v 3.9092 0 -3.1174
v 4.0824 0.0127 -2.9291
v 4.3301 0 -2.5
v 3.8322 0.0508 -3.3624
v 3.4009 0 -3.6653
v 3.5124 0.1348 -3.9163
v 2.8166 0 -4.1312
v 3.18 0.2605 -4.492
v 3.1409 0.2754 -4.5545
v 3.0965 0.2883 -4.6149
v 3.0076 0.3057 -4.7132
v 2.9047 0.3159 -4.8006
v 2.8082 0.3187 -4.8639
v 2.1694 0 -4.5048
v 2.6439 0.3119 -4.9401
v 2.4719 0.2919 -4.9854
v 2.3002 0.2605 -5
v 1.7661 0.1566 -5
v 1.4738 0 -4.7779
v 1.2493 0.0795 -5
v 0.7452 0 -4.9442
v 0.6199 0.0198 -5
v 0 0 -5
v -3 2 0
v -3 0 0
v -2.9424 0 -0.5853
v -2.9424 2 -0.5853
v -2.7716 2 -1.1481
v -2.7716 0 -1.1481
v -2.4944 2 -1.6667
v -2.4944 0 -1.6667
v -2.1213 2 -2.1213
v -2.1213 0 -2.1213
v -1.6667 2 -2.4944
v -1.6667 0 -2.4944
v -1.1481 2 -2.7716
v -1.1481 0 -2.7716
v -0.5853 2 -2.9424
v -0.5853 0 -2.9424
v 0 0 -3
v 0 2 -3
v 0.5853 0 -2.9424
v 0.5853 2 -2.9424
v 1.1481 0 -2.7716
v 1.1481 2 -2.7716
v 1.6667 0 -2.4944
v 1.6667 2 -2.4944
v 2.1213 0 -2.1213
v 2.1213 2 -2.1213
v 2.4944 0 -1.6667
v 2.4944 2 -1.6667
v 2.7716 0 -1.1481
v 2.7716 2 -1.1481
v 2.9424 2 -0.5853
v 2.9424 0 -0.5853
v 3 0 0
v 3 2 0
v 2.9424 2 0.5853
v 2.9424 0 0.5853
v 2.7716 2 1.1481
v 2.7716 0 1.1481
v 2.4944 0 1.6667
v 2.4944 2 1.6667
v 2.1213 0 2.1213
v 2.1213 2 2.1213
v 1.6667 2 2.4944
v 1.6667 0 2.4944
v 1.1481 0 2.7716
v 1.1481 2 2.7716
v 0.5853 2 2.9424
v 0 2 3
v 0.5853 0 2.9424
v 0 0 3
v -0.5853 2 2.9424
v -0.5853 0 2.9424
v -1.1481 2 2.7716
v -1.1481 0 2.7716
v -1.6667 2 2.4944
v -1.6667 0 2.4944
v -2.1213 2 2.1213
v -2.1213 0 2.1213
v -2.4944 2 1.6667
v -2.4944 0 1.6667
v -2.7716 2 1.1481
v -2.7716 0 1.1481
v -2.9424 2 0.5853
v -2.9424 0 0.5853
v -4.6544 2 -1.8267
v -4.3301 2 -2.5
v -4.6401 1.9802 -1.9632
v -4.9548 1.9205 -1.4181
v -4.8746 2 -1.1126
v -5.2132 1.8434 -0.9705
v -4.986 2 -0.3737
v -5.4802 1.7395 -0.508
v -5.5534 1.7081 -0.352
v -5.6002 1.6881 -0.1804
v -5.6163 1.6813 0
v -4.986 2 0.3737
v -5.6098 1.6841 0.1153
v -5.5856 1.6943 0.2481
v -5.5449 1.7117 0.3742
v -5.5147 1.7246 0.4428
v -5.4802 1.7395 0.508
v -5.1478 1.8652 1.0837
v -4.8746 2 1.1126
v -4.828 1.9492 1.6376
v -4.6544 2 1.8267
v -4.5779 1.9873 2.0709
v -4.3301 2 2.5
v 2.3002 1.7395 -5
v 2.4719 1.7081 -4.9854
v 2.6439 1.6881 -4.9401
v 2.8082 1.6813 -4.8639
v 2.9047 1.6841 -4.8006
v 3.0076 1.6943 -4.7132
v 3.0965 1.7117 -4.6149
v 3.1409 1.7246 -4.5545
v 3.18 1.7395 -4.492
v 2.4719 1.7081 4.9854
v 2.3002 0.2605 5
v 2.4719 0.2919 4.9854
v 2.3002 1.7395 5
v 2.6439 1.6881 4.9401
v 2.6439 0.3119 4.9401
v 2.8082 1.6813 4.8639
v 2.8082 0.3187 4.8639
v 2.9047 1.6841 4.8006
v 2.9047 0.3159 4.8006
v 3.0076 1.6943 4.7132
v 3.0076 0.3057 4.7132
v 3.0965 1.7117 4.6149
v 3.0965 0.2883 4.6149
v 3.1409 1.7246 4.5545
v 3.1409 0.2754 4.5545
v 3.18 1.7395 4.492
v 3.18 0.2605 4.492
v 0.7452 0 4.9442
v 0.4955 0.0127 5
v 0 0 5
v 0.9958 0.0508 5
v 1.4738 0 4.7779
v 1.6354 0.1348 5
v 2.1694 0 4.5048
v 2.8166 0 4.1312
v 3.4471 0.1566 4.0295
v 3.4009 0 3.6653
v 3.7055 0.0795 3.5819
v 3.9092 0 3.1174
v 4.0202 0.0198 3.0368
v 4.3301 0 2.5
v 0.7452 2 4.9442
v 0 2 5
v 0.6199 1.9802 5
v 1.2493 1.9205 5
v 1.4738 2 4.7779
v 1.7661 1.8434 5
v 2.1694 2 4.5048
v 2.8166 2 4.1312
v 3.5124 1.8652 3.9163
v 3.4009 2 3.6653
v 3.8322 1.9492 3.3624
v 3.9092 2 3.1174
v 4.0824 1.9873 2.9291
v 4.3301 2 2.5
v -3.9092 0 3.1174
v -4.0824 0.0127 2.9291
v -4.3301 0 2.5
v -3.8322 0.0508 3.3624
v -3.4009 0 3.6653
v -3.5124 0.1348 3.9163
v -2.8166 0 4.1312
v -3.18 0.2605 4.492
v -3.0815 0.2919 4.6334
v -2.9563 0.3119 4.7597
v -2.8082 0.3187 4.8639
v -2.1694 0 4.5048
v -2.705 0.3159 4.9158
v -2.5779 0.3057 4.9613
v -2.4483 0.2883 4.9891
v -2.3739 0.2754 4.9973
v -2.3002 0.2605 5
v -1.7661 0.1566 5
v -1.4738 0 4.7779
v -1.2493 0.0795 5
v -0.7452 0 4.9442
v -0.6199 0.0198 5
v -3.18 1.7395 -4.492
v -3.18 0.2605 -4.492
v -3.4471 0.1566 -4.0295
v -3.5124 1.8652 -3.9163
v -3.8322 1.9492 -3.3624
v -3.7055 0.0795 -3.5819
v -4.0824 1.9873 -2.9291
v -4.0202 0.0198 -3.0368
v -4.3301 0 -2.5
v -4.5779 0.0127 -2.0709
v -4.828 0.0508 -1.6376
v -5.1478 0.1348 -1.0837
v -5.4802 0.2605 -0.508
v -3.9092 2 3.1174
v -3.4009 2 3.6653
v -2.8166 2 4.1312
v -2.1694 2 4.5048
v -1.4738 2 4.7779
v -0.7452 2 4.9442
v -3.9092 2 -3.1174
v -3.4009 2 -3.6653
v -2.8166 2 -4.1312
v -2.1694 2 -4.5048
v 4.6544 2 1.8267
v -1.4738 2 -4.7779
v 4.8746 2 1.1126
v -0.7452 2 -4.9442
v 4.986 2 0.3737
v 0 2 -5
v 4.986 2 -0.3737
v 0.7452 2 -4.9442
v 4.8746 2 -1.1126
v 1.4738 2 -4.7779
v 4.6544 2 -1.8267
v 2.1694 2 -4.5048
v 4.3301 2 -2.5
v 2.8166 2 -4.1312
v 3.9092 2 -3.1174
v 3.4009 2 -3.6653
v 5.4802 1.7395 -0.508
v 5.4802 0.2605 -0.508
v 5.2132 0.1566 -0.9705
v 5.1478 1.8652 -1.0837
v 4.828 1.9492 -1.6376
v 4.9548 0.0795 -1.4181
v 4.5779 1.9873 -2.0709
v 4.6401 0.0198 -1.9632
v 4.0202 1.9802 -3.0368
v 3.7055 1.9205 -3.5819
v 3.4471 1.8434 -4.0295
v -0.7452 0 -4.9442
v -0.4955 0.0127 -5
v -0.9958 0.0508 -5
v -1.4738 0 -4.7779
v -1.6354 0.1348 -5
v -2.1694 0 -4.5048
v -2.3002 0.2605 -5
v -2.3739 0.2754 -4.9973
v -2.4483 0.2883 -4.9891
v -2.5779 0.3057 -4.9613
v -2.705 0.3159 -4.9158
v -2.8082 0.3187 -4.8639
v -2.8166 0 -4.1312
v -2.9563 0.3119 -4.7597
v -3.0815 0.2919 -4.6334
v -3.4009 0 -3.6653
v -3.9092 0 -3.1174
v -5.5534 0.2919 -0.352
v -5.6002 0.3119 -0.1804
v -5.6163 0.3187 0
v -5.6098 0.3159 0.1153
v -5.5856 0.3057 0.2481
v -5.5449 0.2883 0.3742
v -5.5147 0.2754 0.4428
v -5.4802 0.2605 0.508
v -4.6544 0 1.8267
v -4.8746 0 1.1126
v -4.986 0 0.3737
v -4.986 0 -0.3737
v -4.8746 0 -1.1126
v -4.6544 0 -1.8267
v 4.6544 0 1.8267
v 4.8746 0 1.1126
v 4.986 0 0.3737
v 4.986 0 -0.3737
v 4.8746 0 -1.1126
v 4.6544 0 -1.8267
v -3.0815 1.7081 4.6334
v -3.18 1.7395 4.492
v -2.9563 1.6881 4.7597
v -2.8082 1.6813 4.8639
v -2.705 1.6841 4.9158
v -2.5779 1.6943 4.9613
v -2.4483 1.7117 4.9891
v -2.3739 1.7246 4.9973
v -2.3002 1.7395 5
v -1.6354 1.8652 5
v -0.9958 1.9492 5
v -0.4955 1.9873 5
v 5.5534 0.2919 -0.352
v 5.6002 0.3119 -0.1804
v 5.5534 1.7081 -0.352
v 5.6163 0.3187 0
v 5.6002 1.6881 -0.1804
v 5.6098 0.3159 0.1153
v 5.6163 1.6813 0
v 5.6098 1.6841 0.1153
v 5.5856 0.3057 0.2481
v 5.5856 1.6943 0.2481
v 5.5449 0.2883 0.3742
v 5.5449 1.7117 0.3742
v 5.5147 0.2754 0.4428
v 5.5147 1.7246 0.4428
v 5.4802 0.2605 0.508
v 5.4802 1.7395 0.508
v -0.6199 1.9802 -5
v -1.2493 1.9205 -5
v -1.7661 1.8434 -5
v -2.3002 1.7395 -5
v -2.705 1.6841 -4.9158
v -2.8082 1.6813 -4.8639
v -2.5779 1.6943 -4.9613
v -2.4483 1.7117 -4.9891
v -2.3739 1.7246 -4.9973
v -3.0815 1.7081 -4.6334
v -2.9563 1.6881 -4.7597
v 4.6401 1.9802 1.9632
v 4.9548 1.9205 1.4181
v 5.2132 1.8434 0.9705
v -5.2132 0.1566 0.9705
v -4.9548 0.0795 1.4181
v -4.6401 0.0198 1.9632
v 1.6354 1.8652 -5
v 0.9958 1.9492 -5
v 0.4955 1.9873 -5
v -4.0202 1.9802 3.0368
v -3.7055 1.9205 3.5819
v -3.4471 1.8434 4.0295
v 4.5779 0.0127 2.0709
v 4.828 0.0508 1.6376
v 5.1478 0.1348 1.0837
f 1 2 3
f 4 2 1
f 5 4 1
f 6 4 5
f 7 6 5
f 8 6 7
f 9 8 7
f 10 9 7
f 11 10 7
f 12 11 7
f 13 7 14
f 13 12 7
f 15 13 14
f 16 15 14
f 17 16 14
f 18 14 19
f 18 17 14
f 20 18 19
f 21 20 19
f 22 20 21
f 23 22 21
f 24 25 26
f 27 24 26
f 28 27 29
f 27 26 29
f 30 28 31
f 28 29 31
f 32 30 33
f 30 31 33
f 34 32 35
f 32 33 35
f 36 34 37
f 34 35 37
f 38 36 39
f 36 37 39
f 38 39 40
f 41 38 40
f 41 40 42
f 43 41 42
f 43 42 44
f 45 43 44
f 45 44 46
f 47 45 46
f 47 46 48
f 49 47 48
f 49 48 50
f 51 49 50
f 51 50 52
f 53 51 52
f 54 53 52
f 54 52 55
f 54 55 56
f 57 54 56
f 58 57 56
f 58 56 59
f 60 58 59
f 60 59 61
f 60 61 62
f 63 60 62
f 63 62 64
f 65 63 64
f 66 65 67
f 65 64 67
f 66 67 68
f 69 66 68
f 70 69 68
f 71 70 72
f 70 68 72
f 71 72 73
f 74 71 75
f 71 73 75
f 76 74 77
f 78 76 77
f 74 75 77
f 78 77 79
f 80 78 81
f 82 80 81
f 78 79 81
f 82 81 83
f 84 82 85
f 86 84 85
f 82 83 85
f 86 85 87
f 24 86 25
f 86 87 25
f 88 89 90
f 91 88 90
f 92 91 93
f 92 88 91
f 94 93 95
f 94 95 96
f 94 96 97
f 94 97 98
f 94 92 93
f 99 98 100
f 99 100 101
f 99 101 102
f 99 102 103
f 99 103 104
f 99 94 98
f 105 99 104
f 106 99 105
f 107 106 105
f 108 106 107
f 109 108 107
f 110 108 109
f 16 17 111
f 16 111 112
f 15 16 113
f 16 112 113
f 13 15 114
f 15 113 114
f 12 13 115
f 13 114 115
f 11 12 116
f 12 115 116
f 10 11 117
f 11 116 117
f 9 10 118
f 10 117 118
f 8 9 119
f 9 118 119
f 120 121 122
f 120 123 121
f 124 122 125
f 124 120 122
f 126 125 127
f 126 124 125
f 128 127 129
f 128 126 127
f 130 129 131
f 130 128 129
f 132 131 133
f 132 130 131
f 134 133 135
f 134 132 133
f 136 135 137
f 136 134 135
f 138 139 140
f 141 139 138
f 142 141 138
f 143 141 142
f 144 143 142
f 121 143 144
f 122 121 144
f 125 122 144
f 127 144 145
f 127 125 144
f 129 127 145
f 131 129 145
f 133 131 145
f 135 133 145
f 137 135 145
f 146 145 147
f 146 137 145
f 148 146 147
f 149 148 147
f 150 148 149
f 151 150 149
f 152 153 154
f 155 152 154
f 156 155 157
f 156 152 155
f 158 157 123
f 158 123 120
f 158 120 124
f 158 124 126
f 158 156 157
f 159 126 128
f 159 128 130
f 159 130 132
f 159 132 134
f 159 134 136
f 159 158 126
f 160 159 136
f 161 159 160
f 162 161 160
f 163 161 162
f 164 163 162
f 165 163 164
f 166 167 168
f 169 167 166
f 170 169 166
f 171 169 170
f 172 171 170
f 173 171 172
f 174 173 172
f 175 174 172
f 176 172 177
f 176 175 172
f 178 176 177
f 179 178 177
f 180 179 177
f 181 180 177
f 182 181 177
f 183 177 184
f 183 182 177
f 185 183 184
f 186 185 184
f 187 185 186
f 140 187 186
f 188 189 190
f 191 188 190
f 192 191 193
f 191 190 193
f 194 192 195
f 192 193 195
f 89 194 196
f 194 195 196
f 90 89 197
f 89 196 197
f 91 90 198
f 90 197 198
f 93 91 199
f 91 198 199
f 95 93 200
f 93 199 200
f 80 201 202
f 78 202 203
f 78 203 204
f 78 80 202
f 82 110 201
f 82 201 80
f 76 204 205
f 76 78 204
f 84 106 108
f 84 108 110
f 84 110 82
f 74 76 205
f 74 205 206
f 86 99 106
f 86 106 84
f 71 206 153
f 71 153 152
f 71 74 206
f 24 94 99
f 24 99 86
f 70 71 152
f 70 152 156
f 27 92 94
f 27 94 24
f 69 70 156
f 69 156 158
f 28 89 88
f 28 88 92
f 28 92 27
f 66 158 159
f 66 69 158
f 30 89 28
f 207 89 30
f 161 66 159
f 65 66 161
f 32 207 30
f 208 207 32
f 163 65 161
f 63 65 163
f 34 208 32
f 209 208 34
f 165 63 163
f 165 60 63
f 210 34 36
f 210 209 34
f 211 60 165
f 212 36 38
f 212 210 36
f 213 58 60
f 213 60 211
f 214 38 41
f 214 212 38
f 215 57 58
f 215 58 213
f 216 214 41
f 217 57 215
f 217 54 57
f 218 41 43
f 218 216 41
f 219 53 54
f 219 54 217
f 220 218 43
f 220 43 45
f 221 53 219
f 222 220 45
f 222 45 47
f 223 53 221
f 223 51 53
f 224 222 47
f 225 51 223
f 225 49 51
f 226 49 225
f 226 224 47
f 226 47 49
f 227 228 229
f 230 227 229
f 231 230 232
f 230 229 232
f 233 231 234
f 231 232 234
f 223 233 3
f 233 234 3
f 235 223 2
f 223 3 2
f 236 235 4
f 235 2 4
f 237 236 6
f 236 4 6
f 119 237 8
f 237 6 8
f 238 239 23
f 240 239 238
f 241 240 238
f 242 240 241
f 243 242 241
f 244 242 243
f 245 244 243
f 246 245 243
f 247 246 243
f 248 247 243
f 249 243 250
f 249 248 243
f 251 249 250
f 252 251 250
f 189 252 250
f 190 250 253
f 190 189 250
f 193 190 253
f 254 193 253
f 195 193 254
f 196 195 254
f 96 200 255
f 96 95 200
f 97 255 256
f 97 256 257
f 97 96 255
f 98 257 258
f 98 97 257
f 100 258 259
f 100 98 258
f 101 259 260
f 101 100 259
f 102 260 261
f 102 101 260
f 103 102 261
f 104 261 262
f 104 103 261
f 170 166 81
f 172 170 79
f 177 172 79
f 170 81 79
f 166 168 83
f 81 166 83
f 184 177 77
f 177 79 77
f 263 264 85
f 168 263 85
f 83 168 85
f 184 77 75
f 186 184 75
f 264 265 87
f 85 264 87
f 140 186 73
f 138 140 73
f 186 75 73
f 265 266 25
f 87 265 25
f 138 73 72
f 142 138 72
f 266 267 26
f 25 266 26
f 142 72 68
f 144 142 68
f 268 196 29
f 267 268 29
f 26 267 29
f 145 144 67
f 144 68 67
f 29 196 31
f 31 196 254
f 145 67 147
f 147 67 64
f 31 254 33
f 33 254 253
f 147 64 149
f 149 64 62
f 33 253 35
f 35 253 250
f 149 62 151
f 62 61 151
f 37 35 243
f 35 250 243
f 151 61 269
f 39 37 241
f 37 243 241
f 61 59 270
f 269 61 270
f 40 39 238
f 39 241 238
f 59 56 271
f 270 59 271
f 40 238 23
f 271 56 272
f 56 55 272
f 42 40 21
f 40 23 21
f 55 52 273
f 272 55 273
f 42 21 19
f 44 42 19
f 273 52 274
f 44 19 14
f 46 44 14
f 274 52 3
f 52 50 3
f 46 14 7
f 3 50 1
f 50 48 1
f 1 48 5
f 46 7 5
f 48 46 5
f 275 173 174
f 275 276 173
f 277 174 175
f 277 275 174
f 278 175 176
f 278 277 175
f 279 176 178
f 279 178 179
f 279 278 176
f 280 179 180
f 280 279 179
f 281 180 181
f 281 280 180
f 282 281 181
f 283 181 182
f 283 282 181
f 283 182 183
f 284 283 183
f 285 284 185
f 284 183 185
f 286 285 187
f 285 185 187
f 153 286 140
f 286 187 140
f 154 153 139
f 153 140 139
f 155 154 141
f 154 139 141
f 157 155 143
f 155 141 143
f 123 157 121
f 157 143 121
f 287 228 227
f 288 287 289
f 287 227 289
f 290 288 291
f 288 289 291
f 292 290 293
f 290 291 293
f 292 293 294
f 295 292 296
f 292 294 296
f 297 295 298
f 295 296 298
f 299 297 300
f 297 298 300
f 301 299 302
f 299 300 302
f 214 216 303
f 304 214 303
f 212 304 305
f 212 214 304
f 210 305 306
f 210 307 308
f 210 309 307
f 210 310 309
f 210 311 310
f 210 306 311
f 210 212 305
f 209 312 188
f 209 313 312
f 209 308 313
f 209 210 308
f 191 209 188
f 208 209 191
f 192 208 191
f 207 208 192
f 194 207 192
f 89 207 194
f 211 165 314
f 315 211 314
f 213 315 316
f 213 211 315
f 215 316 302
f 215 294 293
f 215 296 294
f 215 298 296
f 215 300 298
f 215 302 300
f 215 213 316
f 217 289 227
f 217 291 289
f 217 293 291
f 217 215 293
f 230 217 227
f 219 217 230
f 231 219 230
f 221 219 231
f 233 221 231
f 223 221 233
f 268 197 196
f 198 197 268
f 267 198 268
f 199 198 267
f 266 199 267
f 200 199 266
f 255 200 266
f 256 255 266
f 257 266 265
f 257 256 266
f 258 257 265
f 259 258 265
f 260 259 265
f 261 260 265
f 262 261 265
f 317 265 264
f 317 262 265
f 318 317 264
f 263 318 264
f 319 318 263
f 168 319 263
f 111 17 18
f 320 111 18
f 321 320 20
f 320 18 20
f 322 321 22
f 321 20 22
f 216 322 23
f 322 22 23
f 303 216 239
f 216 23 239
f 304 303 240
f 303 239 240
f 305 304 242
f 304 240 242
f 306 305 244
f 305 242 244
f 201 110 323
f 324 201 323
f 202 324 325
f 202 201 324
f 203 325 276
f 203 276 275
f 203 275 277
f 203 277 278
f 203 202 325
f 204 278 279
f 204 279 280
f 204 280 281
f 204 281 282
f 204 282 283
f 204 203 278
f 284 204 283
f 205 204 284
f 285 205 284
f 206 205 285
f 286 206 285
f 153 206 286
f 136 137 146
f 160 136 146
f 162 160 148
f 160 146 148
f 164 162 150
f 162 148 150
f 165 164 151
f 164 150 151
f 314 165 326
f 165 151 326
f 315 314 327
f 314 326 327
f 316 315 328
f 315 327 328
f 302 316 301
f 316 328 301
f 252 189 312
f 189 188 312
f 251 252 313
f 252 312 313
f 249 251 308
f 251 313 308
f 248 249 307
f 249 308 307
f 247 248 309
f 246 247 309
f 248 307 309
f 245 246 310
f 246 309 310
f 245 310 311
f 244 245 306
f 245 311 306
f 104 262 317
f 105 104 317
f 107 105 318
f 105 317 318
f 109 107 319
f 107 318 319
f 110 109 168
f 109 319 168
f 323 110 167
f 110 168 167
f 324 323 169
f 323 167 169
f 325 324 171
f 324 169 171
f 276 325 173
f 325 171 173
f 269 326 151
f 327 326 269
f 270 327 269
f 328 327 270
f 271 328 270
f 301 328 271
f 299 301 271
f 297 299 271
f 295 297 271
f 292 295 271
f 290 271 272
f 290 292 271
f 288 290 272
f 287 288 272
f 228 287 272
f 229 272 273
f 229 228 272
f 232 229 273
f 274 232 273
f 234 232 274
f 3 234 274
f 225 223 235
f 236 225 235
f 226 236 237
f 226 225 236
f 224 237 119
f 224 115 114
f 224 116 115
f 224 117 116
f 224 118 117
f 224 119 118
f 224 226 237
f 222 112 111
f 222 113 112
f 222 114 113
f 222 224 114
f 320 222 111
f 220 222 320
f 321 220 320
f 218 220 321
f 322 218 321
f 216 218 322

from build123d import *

# Parameters (mm, degrees)
BOSS_EXTRUDE1_DEPTH   = 2
M7X1_0_TAPPED_HOLE1_D = 6
FILLET1_R             = 1.016


with BuildPart() as part:
    # Sketch1 → Boss-Extrude1 (new body)
    with BuildSketch(Plane(origin=(0, 0, 0), x_dir=(1, 0, 0), z_dir=(0, 1, 0))):
        Polygon((-2.886751346, 5), (-5.773502692, 0), (-2.886751346, -5), (2.886751346, -5), (5.773502692, 0), (2.886751346, 5), align=None)
    extrude(amount=BOSS_EXTRUDE1_DEPTH)

    # M7x1.0 Tapped Hole1 (through all)
    with Locations(Plane(origin=(0, 2, 0), x_dir=(1, 0, 0), z_dir=(0, 1, 0))):
        with Locations((0, 0)):
            Hole(M7X1_0_TAPPED_HOLE1_D / 2)

    # Sketch4 → Cut-Revolve1 (revolve, cut)
    with BuildSketch(Plane.XY):
        Polygon((5.773502692, 1.6), (5.773502692, 2), (5, 2), align=None)
        Polygon((5, 0), (5.773502692, 0), (5.773502692, 0.4), align=None)
    revolve(axis=Axis((0, 0, 0), (0, 1, 0)), mode=Mode.SUBTRACT)

    # Fillet1
    fillet1_edges = [part.edges().sort_by_distance(p)[0] for p in [
        (2.886751346, 1, 5),
        (-2.886751346, 1, 5),
        (-5.773502692, 1, 0),
        (-2.886751346, 1, -5),
        (2.886751346, 1, -5),
        (5.773502692, 1, 0),
    ]]
    fillet(fillet1_edges, radius=FILLET1_R)


solid = part.part
